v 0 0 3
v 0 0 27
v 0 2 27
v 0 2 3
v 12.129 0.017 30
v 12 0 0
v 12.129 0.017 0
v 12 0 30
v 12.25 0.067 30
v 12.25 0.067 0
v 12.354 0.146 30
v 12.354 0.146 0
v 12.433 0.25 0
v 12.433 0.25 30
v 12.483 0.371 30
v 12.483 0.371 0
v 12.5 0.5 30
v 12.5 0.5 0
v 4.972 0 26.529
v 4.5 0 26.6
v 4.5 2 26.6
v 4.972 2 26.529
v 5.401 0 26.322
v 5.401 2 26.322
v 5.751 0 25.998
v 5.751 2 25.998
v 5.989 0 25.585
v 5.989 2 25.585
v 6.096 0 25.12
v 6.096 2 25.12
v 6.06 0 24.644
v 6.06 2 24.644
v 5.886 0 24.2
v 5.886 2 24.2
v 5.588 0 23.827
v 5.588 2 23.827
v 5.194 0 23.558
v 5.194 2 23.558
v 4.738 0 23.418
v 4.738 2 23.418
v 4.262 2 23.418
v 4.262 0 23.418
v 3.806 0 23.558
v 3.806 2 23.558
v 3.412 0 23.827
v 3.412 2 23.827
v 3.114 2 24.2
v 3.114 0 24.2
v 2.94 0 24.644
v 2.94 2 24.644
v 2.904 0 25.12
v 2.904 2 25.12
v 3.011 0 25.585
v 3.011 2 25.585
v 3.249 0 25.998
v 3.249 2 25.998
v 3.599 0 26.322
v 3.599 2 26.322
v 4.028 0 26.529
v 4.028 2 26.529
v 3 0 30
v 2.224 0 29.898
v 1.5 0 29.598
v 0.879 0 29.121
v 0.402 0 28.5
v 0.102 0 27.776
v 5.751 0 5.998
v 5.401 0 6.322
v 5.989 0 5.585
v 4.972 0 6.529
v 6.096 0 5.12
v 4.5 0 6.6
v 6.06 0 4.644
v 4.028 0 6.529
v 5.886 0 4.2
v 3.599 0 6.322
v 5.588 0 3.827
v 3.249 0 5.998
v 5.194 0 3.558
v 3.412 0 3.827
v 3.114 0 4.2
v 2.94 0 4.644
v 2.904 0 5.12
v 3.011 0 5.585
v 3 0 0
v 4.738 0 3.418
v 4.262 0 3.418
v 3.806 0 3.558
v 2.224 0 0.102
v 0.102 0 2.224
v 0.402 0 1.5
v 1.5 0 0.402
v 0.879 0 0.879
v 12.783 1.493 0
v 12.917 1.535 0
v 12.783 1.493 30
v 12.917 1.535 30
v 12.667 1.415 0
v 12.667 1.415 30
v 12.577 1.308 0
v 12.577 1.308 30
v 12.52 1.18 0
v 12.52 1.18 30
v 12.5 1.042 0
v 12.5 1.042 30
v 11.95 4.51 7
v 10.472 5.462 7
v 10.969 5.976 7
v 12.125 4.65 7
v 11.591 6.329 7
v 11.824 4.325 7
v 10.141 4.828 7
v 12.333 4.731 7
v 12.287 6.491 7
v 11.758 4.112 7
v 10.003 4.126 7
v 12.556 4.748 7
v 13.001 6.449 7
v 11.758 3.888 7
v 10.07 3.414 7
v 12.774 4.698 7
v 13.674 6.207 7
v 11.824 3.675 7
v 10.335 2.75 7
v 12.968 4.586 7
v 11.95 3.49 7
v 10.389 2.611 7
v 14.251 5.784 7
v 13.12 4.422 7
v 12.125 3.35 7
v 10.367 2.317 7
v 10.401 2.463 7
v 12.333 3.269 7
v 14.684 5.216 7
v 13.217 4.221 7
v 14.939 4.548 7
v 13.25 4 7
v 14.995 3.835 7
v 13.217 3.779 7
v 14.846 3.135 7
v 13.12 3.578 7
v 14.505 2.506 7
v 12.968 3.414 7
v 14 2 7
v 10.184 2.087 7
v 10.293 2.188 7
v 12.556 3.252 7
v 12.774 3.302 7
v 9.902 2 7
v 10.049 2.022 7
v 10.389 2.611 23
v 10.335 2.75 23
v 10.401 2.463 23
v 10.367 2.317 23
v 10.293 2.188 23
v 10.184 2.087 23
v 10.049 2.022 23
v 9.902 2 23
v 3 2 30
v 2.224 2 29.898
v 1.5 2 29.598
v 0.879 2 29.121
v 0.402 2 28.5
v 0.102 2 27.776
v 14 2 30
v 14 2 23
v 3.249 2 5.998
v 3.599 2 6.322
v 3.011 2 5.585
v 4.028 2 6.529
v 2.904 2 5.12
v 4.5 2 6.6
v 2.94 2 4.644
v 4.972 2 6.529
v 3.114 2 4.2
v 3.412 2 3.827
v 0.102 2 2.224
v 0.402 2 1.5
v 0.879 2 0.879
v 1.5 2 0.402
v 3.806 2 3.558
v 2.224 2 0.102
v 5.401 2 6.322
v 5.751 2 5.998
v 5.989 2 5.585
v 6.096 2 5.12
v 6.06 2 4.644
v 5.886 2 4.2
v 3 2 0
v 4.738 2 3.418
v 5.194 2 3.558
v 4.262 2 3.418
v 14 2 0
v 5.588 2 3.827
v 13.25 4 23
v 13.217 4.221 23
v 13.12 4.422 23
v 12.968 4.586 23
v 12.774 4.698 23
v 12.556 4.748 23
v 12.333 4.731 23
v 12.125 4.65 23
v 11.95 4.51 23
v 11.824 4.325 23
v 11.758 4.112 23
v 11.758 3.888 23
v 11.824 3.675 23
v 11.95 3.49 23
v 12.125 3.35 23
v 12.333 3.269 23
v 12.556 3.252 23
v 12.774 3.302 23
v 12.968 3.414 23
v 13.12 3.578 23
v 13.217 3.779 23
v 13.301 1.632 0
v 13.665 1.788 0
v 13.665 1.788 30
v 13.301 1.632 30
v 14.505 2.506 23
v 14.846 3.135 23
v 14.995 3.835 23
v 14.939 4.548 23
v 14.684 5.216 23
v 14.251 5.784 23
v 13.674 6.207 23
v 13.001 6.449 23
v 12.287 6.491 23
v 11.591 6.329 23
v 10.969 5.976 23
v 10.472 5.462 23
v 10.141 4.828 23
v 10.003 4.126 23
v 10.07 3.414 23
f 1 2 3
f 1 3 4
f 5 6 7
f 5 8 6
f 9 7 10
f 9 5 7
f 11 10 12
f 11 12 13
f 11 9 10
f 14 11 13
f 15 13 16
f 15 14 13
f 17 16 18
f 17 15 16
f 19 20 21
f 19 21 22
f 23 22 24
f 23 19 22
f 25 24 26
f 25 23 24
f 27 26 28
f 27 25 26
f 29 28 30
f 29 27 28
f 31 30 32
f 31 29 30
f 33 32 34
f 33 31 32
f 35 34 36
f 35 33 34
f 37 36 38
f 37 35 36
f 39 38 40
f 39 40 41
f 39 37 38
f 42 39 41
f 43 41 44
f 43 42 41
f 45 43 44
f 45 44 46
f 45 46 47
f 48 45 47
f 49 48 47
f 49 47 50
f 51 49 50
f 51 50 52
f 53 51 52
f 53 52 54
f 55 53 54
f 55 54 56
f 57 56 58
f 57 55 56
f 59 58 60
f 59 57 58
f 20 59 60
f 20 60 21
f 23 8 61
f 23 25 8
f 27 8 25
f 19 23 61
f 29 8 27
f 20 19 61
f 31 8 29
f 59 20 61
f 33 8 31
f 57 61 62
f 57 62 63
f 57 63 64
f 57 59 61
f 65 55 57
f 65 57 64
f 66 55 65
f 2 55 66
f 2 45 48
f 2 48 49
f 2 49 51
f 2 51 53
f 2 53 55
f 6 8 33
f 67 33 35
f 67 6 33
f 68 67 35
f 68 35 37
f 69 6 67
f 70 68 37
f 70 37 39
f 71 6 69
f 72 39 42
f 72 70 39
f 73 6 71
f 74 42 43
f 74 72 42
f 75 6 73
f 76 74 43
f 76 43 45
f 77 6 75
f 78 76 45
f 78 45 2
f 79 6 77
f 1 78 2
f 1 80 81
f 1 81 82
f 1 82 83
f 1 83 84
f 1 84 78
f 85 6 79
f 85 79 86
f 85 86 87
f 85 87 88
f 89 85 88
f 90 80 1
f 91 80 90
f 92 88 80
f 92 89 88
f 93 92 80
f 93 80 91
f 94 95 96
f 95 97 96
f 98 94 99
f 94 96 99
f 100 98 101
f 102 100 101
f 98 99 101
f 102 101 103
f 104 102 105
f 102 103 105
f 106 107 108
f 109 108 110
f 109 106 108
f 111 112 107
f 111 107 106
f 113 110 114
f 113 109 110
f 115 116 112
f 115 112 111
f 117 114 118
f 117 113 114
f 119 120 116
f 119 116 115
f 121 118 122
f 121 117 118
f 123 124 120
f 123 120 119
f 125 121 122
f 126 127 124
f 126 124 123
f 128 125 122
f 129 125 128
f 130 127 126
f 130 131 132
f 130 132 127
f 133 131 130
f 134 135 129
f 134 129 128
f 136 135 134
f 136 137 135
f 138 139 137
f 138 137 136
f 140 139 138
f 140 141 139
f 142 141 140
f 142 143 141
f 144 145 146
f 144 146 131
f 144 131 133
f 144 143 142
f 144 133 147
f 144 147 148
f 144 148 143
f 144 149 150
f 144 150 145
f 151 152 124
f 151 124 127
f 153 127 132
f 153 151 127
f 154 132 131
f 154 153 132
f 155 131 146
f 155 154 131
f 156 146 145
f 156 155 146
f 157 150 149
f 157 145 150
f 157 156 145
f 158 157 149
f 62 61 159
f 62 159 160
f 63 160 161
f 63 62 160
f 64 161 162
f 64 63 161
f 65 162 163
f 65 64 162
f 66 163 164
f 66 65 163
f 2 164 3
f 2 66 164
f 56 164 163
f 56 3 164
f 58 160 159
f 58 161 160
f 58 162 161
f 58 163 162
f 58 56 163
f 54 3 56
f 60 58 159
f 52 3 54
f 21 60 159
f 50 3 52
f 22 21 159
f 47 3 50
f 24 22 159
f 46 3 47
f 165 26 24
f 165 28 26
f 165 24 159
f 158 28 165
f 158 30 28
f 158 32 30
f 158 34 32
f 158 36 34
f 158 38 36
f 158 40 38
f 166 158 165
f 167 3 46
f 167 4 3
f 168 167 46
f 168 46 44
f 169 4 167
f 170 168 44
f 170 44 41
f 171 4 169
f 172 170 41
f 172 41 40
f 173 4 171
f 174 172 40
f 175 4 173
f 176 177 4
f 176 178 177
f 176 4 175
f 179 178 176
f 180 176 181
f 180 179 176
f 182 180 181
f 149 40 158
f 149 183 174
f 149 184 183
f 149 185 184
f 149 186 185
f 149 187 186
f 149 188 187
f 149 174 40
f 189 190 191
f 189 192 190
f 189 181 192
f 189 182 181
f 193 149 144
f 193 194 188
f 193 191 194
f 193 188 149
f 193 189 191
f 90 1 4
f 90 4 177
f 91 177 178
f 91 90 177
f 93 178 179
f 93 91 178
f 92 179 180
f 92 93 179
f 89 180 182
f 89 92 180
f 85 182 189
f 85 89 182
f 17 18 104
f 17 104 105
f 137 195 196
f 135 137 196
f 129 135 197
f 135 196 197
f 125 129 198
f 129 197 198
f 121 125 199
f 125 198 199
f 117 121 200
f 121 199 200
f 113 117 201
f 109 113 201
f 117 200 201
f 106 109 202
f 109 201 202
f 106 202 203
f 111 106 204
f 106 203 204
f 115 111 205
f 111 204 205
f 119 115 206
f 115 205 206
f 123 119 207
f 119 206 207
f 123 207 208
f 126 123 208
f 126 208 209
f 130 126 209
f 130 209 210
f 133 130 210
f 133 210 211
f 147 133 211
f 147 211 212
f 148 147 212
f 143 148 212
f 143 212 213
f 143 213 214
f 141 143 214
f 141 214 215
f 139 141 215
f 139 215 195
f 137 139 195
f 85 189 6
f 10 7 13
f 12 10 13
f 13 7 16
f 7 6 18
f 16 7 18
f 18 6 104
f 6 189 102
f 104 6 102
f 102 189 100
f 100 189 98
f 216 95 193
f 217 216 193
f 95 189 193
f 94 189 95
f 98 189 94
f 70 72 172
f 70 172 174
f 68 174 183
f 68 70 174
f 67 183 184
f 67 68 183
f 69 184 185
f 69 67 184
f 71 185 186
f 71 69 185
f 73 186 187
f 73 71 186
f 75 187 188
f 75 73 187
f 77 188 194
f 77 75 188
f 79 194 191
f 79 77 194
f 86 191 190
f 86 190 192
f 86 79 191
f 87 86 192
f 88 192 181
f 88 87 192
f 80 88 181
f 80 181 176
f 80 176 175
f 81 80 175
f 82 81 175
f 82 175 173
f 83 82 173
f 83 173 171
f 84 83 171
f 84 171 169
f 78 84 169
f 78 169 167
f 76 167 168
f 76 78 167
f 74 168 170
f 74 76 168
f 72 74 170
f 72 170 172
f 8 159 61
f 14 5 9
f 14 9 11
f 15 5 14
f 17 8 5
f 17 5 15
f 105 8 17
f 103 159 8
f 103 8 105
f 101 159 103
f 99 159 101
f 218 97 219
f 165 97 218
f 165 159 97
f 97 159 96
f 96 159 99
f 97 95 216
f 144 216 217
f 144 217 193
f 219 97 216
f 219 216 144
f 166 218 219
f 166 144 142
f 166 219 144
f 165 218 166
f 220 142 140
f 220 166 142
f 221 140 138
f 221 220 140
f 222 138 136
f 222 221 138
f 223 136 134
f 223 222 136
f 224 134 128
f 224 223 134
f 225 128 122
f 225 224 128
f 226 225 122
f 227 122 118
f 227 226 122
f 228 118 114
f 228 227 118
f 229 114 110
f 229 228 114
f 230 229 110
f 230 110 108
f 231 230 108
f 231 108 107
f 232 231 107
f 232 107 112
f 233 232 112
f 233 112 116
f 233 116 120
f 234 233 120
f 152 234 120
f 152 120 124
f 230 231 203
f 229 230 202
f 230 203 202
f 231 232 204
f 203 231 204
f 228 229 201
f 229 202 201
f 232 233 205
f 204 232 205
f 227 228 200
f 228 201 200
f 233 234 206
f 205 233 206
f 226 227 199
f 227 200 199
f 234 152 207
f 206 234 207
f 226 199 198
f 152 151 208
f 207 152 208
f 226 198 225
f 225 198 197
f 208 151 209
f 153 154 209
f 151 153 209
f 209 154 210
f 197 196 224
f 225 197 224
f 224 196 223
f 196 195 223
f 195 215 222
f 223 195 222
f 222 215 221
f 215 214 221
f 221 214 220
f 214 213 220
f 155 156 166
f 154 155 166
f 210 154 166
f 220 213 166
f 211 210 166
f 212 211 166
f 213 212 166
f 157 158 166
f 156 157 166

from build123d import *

# Parameters (mm, degrees)
SKETCH_1_R          = 1.6
EXTRUDE_1_DEPTH     = 2
SKETCH_2_R          = 2.5
EXTRUDE_2_DEPTH     = 30
FILLET_1_R          = 0.5
SKETCH_3_R          = 0.75
CUT_EXTRUDE_1_DEPTH = 35.165040612
SKETCH_4_W          = 5.098076211
SKETCH_4_H          = 7
CUT_EXTRUDE_2_DEPTH = 34.841542518


with BuildPart() as part:
    # 草图1 → 凸台-拉伸1 (new body)
    with BuildSketch(Plane(origin=(0, 0, 0), x_dir=(1, 0, 0), z_dir=(0, 1, 0))):
        with BuildLine():
            Line((3, 0), (12.5, 0))
            Line((12.5, 0), (12.5, -30))
            Line((12.5, -30), (3, -30))
            ThreePointArc((3, -30), (0.878679656, -29.121320344), (0, -27))
            Line((0, -27), (0, -3))
            ThreePointArc((0, -3), (0.878679656, -0.878679656), (3, 0))
        make_face()
        with Locations(Location((4.5, -5, 0), (0, 0, 270))):
            Circle(SKETCH_1_R, mode=Mode.SUBTRACT)
        with Locations(Location((4.5, -25, 0), (0, 0, 270))):
            Circle(SKETCH_1_R, mode=Mode.SUBTRACT)
    extrude(amount=EXTRUDE_1_DEPTH)

    # 草图2 → 凸台-拉伸2 (add)
    with BuildSketch(Plane.XY.offset(30)):
        with Locations((12.5, 4)):
            Circle(SKETCH_2_R)
    extrude(amount=-EXTRUDE_2_DEPTH)

    # 圆角1
    fillet_1_edges = [part.edges().sort_by_distance(p)[0] for p in [
        (12.5, 1.5, 15),
        (11, 2, 15),
        (12.5, 0, 15),
    ]]
    fillet(fillet_1_edges, radius=FILLET_1_R)

    # 草图3 → 切除-拉伸1 (cut, through all)
    with BuildSketch(Plane.XY.offset(30)):
        with Locations((12.5, 4)):
            Circle(SKETCH_3_R)
    extrude(amount=-CUT_EXTRUDE_1_DEPTH, mode=Mode.SUBTRACT)

    # 草图4 → 切除-拉伸2 (cut, through all)
    with BuildSketch(Plane(origin=(0, 2, 0), x_dir=(1, 0, 0), z_dir=(0, 1, 0))):
        with Locations((12.450961895, -3.5)):
            Rectangle(SKETCH_4_W, SKETCH_4_H)
        with Locations((12.450961895, -26.5)):
            Rectangle(SKETCH_4_W, SKETCH_4_H)
    extrude(amount=CUT_EXTRUDE_2_DEPTH, mode=Mode.SUBTRACT)


solid = part.part
